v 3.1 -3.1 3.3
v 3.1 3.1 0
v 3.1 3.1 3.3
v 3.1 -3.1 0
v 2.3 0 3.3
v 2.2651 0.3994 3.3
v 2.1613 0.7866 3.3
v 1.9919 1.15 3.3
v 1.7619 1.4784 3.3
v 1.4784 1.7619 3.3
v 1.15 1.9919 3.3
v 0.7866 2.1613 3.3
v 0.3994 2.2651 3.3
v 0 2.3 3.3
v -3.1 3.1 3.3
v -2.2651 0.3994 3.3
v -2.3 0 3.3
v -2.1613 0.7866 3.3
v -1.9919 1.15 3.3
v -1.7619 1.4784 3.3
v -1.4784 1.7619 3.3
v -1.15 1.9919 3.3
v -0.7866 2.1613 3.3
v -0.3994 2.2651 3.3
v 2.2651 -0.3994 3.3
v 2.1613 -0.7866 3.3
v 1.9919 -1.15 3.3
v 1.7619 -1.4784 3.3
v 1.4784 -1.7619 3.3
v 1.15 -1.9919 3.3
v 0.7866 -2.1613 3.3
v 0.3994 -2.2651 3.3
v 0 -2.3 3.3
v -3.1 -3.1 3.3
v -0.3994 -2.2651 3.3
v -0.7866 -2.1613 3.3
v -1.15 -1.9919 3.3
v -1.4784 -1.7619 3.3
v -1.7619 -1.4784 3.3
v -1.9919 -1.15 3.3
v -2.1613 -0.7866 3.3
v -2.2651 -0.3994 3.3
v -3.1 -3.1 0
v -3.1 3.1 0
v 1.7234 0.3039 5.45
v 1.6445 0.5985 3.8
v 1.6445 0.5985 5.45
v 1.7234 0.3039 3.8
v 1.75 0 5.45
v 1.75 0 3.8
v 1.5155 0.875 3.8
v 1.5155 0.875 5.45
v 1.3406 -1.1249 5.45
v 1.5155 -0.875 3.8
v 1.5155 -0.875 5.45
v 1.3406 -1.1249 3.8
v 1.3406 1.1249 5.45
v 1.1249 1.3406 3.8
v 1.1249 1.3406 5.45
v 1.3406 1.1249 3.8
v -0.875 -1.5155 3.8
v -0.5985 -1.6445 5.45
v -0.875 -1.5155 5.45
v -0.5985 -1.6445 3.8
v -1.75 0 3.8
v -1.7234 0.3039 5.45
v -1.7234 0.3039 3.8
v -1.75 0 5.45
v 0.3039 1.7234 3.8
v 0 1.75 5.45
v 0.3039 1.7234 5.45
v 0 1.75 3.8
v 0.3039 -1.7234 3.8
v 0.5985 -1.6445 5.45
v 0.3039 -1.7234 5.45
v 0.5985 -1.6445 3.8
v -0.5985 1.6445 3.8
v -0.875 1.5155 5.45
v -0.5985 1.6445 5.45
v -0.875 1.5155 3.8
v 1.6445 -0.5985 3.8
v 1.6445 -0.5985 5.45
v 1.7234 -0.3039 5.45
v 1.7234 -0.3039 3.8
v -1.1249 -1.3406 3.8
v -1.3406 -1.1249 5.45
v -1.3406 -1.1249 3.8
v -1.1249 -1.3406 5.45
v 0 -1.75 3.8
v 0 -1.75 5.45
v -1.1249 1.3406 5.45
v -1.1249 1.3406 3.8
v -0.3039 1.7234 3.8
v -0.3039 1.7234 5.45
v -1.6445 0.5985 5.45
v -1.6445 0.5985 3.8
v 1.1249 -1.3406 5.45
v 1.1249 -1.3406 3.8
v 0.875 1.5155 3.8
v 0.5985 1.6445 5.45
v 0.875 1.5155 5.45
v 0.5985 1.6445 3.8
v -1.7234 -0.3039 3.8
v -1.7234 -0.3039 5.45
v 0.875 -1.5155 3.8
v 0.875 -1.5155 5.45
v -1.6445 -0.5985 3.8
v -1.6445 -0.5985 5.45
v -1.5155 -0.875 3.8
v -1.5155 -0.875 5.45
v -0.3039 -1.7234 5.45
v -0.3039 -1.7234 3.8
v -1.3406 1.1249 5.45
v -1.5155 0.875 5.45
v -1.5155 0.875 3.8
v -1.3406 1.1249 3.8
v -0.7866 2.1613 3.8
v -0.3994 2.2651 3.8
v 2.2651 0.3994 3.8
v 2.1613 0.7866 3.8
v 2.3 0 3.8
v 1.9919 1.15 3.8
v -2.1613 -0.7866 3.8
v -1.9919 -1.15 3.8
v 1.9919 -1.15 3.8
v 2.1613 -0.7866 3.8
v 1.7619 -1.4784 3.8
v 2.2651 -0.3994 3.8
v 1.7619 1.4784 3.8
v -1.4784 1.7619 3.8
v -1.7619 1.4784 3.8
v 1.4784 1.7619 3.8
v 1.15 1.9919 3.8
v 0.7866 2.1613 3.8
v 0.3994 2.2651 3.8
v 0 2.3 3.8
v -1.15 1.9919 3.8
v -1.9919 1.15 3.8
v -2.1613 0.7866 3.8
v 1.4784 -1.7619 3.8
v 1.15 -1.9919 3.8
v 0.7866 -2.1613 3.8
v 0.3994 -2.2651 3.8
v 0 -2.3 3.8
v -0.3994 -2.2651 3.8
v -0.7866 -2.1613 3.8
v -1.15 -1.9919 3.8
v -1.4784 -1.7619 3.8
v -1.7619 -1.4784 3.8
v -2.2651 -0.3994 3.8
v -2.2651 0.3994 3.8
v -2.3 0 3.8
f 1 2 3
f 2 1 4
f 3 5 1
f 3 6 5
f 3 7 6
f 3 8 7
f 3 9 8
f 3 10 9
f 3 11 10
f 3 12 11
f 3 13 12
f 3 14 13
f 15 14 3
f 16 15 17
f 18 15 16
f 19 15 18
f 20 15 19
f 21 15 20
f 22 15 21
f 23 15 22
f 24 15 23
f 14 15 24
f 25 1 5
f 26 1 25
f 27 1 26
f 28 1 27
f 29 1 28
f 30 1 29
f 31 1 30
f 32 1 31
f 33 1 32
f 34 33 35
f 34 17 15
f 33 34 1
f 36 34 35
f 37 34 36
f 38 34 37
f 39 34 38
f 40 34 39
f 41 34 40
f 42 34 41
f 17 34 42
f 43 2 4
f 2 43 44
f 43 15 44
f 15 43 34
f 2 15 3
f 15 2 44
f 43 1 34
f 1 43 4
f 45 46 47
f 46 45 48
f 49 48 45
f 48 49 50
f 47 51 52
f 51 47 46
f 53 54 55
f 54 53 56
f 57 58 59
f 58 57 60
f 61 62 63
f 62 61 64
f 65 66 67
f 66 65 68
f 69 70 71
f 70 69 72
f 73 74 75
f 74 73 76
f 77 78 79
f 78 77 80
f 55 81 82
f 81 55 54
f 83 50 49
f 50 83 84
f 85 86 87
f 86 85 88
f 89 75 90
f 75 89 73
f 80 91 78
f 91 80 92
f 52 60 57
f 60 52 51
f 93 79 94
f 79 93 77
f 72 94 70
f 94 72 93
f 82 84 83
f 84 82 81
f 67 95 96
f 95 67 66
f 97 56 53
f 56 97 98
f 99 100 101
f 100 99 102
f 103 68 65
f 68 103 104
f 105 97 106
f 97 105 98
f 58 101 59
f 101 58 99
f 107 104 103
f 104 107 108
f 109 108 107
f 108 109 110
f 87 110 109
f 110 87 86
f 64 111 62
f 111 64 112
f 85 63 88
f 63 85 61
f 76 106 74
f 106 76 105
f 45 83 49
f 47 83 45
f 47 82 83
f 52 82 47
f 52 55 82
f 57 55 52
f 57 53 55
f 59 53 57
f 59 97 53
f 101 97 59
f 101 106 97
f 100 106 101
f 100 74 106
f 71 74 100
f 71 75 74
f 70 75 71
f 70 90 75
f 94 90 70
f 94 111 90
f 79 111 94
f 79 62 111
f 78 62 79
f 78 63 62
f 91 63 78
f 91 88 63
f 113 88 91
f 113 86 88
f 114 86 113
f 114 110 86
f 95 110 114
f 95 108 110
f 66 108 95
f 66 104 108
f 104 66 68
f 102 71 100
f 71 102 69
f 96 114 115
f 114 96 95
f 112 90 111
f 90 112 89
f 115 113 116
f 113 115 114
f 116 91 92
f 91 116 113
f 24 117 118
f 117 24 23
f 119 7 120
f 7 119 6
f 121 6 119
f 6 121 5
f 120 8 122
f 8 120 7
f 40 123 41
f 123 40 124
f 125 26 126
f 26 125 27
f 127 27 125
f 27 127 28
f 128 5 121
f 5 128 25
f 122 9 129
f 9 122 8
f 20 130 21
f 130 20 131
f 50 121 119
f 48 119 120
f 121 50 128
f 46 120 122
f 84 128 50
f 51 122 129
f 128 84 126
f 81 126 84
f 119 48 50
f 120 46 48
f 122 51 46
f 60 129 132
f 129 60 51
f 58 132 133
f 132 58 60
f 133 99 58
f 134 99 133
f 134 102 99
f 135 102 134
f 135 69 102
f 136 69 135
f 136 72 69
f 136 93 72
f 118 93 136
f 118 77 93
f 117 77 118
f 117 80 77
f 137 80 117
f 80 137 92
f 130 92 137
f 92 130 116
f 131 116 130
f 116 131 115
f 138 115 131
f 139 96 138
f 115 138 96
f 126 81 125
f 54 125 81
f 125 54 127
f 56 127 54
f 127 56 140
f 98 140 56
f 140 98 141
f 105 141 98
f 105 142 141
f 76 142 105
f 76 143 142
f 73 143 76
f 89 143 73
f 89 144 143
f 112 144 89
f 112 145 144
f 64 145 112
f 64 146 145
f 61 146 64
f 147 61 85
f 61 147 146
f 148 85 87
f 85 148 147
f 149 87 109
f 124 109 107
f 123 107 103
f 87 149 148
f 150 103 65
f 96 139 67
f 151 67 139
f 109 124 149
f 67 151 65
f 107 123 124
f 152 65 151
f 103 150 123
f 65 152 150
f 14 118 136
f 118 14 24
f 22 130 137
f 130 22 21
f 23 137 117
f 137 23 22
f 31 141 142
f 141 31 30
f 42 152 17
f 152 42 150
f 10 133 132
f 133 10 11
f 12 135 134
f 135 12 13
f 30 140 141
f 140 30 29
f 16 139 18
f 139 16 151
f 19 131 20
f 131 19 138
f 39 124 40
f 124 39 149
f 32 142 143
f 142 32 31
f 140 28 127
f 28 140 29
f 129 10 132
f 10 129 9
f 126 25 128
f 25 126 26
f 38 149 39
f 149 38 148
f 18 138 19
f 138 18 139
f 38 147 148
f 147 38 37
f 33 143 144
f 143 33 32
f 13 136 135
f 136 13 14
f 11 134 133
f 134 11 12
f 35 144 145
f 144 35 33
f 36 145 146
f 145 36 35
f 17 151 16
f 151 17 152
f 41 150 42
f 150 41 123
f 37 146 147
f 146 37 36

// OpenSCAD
/*
  Through hole tactile switch based on CTS 222A tactile switch
  http://www.mouser.com/ds/2/96/222A-531986.pdf

  Aaron Ciuffo (txoof) 

  23 December 2015

  Released under GPL V3

  TODO: 
    * add vertical and horizontal mount variants
    * add legs

*/

/* [Switch Dimensions] */
switchBase = [6.2, 6.2, 3.3]; // X, Y, Z dimensions of base
switchButtonDia = 3.5; // button diameter
switchButtonZ = 4.3; // total height of button
buttonStandoffZ = 0.5; // standoffs above the height of the base
buttonStandoffX = 4.6; // diameter of standoffs

/* [options] */
// center around the volume of the base, or place at the positive origin
center = false; // [true,false] 

// add "spear" to make locating easier
locate = false; // [true,false]

module tactileSwitch(locate = false, center = false) {
  $fn = 36;
  // center around the volume of the base or move so base sits at origin
  trans = center == false ? [0, 0, switchBase[2]/2] : [0, 0, 0];

  translate(trans) // move the object to the location set above
  union() {
    color("darkslategray")
      cube(switchBase, center = true);
    translate([0, 0, switchBase[2]/2])
      color("darkgray")
      cylinder(r = switchButtonDia/2, h = switchButtonZ, center = true);
    translate([0, 0, buttonStandoffZ/2])
      color("silver")
      cylinder(r = buttonStandoffX/2, h = switchBase[2] + buttonStandoffZ, center = true);
    if(locate) {
      color("red")
      cylinder(h = switchButtonZ* 20, r = .1, center = true);
    }
  }

}

tactileSwitch(locate = locate, center = center);
